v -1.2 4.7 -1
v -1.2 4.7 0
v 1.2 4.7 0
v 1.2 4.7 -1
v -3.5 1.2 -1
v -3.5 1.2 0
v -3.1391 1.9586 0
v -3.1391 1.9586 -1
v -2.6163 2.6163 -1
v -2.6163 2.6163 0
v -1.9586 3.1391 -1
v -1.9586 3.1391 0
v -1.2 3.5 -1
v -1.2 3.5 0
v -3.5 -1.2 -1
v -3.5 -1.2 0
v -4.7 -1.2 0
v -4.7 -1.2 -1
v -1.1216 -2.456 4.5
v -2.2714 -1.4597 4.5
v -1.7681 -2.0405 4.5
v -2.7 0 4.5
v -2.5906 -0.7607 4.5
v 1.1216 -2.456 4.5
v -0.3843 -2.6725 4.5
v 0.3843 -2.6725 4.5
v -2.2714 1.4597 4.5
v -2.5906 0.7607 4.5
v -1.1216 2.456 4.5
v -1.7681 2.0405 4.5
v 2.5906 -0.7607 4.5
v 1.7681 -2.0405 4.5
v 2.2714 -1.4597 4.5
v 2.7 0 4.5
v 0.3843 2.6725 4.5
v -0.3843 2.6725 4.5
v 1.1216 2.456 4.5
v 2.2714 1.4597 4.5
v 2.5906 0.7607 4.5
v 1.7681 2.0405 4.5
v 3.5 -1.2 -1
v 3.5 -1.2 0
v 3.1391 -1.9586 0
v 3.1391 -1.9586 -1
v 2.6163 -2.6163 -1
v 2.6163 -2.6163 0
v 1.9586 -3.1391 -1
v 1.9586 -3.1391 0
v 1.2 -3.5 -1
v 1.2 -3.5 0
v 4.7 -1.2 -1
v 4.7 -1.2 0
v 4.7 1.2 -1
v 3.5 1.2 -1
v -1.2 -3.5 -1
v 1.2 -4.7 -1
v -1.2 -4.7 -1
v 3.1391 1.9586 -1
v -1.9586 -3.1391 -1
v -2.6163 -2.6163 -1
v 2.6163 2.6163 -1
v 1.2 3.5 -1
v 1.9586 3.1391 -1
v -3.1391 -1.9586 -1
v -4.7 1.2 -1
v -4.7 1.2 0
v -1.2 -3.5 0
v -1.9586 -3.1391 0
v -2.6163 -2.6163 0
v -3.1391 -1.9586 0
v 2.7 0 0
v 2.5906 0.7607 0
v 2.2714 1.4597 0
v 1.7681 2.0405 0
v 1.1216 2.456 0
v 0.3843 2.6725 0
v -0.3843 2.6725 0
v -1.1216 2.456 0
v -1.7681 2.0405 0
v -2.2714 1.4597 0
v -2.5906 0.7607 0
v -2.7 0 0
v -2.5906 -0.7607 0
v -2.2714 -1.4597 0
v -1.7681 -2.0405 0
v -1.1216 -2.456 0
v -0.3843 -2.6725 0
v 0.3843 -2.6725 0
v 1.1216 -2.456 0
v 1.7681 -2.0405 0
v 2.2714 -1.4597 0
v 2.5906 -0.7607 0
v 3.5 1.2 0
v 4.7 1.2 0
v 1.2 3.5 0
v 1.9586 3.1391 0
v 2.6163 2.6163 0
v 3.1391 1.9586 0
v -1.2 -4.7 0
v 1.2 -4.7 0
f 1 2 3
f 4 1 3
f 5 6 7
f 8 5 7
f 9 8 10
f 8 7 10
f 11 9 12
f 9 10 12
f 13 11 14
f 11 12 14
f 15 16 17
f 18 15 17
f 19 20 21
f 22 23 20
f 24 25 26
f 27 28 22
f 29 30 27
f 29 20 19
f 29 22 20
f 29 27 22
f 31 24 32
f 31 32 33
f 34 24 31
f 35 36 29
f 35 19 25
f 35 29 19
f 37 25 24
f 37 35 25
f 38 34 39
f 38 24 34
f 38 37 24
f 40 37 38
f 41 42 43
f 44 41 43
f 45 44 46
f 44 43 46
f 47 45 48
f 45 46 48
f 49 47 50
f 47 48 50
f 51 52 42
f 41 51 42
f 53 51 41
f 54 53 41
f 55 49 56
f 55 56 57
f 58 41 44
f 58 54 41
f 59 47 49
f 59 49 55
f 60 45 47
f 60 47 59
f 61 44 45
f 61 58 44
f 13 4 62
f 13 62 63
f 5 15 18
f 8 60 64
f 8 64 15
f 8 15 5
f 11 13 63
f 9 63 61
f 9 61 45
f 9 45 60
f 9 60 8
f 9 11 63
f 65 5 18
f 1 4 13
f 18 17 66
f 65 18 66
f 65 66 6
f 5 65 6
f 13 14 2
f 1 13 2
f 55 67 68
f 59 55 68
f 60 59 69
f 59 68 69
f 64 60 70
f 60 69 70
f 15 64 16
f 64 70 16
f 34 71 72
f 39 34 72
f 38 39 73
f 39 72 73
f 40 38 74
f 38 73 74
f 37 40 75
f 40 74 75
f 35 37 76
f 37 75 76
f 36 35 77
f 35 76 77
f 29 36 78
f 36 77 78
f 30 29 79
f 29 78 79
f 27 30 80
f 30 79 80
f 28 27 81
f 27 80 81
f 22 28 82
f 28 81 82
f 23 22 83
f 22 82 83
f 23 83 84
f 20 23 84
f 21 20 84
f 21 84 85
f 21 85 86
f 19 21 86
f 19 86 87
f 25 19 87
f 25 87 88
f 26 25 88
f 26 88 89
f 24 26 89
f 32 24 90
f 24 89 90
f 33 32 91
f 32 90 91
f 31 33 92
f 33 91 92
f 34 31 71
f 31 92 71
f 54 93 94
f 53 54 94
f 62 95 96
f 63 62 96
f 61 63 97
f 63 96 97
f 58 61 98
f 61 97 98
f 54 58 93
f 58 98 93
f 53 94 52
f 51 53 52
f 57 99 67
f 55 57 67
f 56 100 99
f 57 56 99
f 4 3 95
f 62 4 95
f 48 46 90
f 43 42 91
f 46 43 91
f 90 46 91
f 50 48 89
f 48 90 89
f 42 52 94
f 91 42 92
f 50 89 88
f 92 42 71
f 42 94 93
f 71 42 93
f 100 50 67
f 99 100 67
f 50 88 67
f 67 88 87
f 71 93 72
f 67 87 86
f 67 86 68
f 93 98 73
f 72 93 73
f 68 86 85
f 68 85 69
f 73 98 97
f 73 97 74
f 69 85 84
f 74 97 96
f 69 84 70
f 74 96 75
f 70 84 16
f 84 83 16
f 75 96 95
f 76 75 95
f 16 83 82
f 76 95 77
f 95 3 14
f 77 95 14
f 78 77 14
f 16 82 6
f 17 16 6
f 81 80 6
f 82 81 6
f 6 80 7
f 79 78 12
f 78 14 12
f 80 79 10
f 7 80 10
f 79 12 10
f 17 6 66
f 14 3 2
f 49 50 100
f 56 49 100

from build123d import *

# Parameters (mm, degrees)
SKETCH1_R           = 2.7
BOSS_EXTRUDE1_DEPTH = 4.5
BOSS_EXTRUDE2_DEPTH = 1


with BuildPart() as part:
    # Sketch1 → Boss-Extrude1 (new body)
    with BuildSketch(Plane.XY):
        Circle(SKETCH1_R)
    extrude(amount=BOSS_EXTRUDE1_DEPTH)

    # Sketch2 → Boss-Extrude2 (add)
    with BuildSketch(Plane(origin=(0, 0, 0), x_dir=(-1, 0, 0), z_dir=(0, 0, -1))):
        with BuildLine():
            Line((-3.5, 1.2), (-4.7, 1.2))
            Line((-4.7, 1.2), (-4.7, -1.2))
            Line((-4.7, -1.2), (-3.5, -1.2))
            ThreePointArc((-3.5, -1.2), (-2.61629509, -2.61629509), (-1.2, -3.5))
            Line((-1.2, -3.5), (-1.2, -4.7))
            Line((-1.2, -4.7), (1.2, -4.7))
            Line((1.2, -4.7), (1.2, -3.5))
            ThreePointArc((1.2, -3.5), (2.61629509, -2.61629509), (3.5, -1.2))
            Line((3.5, -1.2), (4.7, -1.2))
            Line((4.7, -1.2), (4.7, 1.2))
            Line((4.7, 1.2), (3.5, 1.2))
            ThreePointArc((3.5, 1.2), (2.61629509, 2.61629509), (1.2, 3.5))
            Line((1.2, 3.5), (1.2, 4.7))
            Line((1.2, 4.7), (-1.2, 4.7))
            Line((-1.2, 4.7), (-1.2, 3.5))
            ThreePointArc((-1.2, 3.5), (-2.61629509, 2.61629509), (-3.5, 1.2))
        make_face()
    extrude(amount=BOSS_EXTRUDE2_DEPTH)


solid = part.part
